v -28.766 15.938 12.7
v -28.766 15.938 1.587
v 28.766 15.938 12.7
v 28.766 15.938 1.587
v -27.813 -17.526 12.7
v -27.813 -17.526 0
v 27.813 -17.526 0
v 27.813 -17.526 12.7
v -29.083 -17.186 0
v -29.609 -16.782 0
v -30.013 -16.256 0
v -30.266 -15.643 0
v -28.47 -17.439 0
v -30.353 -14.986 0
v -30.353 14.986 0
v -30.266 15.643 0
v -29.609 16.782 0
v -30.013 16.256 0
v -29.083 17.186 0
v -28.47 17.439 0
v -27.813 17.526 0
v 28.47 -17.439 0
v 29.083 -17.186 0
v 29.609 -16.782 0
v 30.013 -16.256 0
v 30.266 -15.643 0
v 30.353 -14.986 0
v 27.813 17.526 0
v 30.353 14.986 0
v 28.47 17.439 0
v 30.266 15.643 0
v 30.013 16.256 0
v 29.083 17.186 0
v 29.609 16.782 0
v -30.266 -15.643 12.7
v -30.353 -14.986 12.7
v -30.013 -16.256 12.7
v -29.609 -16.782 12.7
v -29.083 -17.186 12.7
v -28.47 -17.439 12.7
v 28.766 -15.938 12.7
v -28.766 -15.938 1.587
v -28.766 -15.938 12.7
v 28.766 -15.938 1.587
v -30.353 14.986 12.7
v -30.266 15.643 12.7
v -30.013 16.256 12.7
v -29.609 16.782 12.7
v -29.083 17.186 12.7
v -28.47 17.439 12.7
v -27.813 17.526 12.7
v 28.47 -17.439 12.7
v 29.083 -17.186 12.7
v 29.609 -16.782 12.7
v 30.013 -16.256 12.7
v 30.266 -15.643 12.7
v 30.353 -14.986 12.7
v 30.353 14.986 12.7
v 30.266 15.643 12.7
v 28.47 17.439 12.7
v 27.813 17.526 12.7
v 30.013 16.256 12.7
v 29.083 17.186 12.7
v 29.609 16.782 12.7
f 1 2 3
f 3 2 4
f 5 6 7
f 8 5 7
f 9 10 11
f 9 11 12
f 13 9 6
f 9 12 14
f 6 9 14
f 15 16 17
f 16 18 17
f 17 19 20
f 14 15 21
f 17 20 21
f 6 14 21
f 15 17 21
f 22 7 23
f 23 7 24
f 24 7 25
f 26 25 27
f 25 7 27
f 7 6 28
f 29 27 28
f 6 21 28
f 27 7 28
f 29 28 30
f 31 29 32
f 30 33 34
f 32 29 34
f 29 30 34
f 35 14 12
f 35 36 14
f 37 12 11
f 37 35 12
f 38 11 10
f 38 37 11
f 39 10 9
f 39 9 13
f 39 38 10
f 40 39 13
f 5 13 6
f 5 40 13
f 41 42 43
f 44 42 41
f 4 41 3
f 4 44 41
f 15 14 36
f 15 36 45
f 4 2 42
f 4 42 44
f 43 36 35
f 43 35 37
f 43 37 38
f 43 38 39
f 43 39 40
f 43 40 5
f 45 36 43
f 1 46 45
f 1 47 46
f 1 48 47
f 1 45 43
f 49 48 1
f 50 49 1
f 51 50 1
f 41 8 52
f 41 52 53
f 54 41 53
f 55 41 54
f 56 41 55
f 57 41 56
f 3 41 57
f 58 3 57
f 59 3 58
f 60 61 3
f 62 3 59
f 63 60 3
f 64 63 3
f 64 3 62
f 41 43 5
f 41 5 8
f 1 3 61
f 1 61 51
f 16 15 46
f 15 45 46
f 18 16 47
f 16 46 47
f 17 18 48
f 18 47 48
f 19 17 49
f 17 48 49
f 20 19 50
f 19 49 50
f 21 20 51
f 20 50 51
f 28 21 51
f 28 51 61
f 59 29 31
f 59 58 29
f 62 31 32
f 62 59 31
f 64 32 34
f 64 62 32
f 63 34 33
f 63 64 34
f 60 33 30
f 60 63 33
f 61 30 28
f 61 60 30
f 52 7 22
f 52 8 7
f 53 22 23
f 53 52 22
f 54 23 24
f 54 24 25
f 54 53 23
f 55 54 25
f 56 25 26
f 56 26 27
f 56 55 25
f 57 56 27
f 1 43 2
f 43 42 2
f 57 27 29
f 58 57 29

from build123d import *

# Parameters (mm, degrees)
F0_W     = 60.706
F0_H     = 35.052
F1_DEPTH = 12.7
F2_T     = -1.5875
F3_R     = 2.54


with BuildPart() as f1:
    # F0 (on Top) → F1 (new body)
    with BuildSketch(Plane.XY):
        Rectangle(F0_W, F0_H)
    extrude(amount=F1_DEPTH)

    # F2
    f2_openings = [f1.faces().sort_by_distance(p)[0] for p in [
        (0, 0, 12.7),
    ]]
    offset(amount=F2_T, openings=f2_openings)

    # F3
    f3_edges = [f1.edges().sort_by_distance(p)[0] for p in [
        (-30.353, -17.526, 6.35),
        (-30.353, 17.526, 6.35),
        (30.353, -17.526, 6.35),
        (30.353, 17.526, 6.35),
    ]]
    fillet(f3_edges, radius=F3_R)


solid = f1.part
